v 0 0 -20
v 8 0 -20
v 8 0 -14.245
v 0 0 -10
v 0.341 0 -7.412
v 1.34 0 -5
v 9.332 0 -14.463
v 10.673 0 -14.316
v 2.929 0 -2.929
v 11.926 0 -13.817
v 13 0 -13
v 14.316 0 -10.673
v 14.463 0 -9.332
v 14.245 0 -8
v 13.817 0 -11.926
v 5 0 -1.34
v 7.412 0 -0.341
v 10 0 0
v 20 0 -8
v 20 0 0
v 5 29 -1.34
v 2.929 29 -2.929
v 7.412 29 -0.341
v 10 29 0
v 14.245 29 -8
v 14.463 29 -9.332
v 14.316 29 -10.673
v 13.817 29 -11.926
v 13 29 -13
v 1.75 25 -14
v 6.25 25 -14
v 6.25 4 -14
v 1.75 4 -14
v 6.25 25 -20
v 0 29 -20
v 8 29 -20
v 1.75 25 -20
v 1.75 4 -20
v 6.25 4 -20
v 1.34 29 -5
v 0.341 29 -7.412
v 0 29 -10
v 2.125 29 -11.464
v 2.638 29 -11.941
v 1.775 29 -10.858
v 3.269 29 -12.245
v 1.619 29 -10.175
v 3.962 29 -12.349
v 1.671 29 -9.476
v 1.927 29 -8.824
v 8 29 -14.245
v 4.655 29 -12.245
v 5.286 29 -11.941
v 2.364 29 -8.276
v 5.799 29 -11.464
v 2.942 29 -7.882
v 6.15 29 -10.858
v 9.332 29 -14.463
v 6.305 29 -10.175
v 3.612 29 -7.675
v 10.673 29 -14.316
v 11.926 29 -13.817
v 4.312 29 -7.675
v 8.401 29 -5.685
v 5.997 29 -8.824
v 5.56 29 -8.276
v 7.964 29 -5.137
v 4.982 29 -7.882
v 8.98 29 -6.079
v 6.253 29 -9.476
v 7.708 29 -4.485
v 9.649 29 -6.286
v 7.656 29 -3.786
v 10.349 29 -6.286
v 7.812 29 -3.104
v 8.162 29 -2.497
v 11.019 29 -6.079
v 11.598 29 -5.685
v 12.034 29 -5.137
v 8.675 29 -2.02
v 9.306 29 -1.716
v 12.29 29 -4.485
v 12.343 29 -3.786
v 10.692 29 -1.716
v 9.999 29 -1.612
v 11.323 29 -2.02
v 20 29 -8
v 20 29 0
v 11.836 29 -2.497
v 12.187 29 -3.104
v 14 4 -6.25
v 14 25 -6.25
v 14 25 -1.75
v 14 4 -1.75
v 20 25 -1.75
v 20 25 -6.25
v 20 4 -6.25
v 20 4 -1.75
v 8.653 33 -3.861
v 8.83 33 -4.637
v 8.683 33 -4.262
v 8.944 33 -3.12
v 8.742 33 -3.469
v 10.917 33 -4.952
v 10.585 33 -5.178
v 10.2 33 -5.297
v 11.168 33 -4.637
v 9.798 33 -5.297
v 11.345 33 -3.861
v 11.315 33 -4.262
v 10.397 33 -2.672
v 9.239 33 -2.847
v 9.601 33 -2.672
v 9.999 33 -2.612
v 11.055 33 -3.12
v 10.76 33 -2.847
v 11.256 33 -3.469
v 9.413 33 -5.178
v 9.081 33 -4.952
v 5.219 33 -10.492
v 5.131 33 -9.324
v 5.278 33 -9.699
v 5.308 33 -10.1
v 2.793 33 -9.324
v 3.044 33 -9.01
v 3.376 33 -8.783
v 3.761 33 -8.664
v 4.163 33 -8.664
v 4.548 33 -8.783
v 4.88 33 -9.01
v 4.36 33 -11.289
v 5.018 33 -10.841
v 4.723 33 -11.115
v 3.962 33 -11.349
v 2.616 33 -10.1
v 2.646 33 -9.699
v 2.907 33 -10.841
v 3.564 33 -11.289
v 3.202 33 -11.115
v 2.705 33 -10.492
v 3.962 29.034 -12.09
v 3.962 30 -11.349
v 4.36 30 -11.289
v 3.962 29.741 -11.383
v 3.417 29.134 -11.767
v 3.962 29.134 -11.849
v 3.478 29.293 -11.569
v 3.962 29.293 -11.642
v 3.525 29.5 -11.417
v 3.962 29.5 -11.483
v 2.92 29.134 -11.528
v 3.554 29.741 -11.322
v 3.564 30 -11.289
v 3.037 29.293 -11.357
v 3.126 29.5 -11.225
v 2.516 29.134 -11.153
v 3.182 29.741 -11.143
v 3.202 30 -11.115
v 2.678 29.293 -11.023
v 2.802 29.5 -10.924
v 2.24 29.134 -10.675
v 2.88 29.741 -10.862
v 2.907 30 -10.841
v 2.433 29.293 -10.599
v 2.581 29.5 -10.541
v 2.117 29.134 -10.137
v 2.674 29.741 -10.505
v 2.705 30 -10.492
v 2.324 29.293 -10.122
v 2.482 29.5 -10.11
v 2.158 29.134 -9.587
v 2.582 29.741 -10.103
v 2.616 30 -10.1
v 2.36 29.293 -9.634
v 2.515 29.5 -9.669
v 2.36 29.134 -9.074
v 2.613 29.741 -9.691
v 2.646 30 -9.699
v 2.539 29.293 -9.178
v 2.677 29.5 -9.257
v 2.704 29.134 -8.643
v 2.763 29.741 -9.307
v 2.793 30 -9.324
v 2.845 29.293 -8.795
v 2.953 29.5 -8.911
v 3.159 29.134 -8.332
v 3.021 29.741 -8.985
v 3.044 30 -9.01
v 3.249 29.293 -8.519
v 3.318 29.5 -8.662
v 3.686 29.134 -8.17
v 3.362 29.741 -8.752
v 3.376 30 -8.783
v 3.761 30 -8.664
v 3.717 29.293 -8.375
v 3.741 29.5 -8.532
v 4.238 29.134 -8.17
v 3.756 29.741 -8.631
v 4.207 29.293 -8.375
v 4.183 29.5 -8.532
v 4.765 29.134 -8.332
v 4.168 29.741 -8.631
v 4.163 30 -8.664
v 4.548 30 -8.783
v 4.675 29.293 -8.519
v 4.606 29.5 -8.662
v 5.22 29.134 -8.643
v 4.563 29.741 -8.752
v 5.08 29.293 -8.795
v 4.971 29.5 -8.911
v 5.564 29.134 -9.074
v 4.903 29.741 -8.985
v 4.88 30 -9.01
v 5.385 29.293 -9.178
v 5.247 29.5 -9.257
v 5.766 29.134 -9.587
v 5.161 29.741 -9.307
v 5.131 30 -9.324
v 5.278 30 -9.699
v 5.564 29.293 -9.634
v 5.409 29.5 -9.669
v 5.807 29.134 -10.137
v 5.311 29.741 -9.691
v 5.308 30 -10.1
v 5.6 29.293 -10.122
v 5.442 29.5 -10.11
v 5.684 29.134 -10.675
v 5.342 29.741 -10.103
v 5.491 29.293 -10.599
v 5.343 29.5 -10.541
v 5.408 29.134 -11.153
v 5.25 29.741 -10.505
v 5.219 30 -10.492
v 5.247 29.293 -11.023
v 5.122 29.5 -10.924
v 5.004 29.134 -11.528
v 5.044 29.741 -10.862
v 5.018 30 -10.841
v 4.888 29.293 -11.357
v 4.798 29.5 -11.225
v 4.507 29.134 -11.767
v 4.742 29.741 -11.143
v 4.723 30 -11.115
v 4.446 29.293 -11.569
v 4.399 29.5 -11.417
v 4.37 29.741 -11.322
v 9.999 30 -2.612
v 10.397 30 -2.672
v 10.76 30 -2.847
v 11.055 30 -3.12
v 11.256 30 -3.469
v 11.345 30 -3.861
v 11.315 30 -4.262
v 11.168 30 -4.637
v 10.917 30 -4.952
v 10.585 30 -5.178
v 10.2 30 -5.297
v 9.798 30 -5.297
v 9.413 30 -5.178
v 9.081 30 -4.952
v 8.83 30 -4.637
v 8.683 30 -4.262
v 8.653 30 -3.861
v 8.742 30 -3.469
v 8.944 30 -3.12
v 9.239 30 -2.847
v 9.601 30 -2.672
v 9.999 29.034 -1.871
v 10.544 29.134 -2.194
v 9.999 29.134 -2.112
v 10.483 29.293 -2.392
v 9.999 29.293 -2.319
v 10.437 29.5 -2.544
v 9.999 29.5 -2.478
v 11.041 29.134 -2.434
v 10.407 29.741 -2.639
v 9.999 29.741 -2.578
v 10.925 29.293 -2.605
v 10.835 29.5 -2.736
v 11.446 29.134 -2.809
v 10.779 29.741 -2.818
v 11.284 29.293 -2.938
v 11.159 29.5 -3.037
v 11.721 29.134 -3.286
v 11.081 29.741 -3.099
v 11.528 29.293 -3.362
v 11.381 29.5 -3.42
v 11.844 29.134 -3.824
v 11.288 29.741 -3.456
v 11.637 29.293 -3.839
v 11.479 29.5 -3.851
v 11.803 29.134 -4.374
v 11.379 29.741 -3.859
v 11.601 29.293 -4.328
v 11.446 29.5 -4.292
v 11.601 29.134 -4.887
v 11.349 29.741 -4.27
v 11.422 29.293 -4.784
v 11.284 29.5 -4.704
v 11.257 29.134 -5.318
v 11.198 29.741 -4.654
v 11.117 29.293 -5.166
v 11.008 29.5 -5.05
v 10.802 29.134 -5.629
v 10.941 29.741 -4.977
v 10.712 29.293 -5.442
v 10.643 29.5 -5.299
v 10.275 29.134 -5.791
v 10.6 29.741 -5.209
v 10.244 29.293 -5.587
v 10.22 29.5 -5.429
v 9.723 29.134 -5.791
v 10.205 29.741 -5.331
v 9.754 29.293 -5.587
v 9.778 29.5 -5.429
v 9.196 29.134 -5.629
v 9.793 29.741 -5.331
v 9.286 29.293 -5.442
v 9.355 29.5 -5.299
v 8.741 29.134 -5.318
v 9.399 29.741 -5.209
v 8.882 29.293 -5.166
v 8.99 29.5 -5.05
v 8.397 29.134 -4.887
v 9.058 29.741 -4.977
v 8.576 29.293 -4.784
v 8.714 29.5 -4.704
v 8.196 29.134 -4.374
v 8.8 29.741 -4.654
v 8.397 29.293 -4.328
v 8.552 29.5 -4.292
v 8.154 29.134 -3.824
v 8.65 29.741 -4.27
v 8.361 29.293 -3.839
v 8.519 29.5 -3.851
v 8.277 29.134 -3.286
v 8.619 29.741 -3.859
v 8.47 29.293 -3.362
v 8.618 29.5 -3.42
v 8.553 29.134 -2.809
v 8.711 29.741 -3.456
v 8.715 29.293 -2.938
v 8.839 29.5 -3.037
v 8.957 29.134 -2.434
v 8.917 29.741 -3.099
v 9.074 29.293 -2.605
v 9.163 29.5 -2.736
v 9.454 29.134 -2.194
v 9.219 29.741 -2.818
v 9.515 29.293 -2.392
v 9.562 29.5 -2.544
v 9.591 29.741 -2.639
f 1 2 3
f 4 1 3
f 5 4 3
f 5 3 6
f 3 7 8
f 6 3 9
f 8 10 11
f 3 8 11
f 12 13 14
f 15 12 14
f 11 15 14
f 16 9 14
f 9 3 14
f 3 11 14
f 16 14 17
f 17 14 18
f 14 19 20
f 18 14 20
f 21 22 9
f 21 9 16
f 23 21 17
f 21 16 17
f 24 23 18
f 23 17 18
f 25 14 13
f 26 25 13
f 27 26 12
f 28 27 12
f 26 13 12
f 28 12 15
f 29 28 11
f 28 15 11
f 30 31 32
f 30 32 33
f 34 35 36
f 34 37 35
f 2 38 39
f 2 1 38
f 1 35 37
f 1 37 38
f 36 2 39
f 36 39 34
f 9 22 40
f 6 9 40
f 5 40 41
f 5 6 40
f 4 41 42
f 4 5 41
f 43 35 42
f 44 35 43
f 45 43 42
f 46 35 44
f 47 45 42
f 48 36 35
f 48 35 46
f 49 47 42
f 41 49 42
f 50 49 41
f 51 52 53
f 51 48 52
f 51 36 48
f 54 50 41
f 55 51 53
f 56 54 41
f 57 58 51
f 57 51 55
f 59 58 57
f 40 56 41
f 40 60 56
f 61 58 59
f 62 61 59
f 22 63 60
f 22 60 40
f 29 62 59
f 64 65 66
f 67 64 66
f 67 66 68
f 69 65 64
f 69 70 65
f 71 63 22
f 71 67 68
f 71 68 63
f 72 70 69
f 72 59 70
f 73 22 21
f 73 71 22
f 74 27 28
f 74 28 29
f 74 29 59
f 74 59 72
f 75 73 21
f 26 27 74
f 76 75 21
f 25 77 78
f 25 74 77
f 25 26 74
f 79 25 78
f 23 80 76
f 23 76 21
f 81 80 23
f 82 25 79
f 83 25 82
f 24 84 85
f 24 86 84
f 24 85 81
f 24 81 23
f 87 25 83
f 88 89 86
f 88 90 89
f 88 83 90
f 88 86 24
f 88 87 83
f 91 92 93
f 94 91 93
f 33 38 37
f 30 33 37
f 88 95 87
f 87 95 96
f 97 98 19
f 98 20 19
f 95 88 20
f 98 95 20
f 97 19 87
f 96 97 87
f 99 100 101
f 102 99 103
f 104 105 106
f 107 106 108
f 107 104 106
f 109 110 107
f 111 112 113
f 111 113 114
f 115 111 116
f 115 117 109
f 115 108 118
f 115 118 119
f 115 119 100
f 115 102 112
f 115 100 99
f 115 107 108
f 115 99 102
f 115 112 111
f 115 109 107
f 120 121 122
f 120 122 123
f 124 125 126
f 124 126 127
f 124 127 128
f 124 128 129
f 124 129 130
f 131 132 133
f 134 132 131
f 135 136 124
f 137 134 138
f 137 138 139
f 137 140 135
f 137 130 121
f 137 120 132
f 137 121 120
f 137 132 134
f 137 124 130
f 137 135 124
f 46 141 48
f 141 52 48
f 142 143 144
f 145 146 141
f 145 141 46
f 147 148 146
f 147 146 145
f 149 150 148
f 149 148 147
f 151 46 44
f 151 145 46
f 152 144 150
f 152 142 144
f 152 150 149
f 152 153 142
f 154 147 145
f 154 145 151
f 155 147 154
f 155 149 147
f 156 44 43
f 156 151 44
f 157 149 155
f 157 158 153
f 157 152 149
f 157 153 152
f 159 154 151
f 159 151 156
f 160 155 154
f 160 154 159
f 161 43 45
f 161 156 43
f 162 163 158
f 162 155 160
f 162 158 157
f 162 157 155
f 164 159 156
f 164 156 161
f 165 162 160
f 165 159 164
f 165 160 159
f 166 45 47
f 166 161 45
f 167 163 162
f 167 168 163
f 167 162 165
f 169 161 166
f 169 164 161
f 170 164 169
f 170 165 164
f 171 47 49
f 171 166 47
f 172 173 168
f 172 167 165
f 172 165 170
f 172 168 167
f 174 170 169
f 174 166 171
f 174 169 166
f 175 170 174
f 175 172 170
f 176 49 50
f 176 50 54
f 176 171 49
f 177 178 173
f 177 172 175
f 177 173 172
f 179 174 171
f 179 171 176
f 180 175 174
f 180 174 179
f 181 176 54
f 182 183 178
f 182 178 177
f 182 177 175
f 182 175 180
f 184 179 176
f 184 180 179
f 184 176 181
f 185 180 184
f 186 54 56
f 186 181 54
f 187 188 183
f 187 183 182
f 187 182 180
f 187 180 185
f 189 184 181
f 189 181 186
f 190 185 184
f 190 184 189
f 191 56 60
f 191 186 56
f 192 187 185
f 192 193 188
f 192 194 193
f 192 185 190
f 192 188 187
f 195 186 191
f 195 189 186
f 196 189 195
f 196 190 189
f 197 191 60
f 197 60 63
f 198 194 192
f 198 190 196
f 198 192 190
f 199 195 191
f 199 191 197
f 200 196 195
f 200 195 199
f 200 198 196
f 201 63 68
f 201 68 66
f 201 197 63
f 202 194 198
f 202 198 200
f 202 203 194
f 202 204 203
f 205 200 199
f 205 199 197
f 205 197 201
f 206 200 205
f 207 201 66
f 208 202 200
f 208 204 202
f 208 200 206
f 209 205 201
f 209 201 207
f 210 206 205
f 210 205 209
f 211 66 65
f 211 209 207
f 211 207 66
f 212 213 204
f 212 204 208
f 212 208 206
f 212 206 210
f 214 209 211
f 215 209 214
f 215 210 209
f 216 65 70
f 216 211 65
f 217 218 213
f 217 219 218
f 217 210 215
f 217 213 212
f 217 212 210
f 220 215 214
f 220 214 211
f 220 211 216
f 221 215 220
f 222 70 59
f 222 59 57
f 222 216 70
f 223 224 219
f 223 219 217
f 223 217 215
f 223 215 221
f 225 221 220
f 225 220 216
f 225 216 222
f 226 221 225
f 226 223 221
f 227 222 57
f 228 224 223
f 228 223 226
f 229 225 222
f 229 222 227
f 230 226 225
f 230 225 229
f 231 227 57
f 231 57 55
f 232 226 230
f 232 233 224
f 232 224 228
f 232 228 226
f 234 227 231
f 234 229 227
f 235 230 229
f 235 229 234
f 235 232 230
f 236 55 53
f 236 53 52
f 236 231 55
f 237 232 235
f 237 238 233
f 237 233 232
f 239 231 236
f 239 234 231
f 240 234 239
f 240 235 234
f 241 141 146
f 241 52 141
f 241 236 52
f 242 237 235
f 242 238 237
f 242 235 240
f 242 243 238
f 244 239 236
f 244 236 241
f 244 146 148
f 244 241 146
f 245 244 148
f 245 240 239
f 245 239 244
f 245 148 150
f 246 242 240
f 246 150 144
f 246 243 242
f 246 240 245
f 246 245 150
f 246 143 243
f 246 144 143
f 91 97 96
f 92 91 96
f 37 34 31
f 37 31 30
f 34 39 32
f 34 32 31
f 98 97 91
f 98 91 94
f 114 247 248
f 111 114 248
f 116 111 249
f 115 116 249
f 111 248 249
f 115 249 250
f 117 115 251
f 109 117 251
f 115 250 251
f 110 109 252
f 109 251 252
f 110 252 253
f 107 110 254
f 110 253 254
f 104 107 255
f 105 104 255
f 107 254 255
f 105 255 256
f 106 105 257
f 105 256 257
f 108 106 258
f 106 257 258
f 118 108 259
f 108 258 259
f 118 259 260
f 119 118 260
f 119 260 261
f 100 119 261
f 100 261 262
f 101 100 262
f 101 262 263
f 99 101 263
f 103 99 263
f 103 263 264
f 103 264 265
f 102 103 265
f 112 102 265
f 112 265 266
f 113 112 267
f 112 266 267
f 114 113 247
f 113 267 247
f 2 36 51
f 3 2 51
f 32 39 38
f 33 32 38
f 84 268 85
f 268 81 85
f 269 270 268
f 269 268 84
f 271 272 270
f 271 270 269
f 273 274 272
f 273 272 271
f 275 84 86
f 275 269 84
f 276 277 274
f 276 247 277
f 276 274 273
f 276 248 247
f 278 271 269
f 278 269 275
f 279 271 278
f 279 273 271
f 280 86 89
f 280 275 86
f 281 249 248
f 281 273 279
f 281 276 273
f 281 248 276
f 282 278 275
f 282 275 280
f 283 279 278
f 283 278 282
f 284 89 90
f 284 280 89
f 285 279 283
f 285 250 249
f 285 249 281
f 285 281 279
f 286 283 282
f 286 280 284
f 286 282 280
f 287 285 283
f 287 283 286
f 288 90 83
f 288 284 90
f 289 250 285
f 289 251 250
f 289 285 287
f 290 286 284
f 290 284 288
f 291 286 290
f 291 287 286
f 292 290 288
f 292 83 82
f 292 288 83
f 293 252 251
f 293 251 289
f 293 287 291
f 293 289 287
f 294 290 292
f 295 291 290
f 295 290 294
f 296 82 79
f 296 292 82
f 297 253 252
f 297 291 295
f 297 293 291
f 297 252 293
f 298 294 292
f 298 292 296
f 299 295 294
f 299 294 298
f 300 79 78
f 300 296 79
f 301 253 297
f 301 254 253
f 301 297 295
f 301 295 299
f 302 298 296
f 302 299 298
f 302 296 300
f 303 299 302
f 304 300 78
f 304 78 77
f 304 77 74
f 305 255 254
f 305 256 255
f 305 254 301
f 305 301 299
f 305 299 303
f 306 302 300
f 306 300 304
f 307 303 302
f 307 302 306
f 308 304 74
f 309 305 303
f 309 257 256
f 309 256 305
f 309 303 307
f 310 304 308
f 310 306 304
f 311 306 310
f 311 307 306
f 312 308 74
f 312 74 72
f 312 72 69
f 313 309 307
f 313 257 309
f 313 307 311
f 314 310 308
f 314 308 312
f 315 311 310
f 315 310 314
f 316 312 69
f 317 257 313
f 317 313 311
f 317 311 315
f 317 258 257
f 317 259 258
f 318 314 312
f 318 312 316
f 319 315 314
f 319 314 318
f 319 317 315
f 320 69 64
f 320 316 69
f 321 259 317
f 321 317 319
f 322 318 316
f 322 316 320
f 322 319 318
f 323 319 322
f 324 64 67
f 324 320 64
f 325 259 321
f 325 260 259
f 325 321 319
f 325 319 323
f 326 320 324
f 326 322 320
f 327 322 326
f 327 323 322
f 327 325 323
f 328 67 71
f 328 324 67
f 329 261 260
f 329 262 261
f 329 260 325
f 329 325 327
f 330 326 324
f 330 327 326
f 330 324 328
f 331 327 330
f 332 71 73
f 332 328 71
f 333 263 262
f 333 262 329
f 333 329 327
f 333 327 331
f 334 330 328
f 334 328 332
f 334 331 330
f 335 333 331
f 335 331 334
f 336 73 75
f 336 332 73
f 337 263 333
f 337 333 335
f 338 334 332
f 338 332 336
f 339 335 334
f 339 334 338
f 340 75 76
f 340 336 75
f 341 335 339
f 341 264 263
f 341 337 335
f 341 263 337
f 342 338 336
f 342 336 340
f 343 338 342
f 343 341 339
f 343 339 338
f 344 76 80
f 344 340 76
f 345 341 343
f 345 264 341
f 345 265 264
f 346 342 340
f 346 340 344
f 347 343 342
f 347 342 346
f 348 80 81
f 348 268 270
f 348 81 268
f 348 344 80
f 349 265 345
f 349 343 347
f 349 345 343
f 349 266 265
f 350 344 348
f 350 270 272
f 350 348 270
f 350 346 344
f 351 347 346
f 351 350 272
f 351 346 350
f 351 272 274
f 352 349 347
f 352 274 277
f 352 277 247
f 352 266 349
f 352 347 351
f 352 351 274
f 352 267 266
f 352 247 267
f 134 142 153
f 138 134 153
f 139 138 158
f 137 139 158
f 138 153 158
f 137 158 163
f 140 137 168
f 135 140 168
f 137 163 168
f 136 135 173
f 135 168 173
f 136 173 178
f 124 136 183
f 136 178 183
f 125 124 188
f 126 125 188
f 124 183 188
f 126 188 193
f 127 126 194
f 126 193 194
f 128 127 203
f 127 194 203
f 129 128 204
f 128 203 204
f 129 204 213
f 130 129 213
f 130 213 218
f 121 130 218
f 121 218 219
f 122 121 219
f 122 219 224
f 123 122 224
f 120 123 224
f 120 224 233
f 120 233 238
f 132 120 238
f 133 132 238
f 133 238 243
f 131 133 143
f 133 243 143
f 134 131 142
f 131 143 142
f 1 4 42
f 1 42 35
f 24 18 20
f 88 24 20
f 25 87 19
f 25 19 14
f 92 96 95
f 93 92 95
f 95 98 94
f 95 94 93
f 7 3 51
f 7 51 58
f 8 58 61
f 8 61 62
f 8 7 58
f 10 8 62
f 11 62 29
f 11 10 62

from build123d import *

# Parameters (mm, degrees)
BOSS_EXTRUDE1_DEPTH = 29
SKETCH3_W           = 4.5
SKETCH3_H           = 21
CUT_EXTRUDE1_DEPTH  = 6
SKETCH5_R           = 1.35
BOSS_EXTRUDE2_DEPTH = 4
FILLET1_R           = 1


with BuildPart() as part:
    # Sketch2 → Boss-Extrude1 (new body)
    with BuildSketch(Plane(origin=(0, 0, 0), x_dir=(1, 0, 0), z_dir=(0, 1, 0))):
        with BuildLine():
            Line((0, 10), (0, 20))
            Line((0, 20), (8, 20))
            Line((8, 20), (8, 14.245191882))
            ThreePointArc((8, 14.245191882), (10.672752557, 14.316274399), (13, 13))
            Line((13, 13), (9.464466094, 9.464466094))
            Line((9.464466094, 9.464466094), (2.928932188, 2.928932188))
            ThreePointArc((2.928932188, 2.928932188), (0.761204675, 6.173165676), (0, 10))
        make_face()
    boss_extrude1 = extrude(amount=BOSS_EXTRUDE1_DEPTH)

    # Mirror1: Boss-Extrude1 across plane
    add(boss_extrude1.mirror(Plane(origin=(0, 0, 0), x_dir=(-0.707106781186546, 0, 0.707106781186549), z_dir=(0.707106781186549, 0, 0.707106781186546))))

    # Sketch3 → Cut-Extrude1 (cut)
    with BuildSketch(Plane(origin=(0, 0, -20), x_dir=(-1, 0, 0), z_dir=(0, 0, -1))):
        with Locations((-4, 14.5)):
            Rectangle(SKETCH3_W, SKETCH3_H)
    cut_extrude1 = extrude(amount=-CUT_EXTRUDE1_DEPTH, mode=Mode.SUBTRACT)

    # Mirror2: Cut-Extrude1 across plane
    add(cut_extrude1.mirror(Plane(origin=(0, 0, 0), x_dir=(-0.707106781186546, 0, 0.707106781186549), z_dir=(0.707106781186549, 0, 0.707106781186546))), mode=Mode.SUBTRACT)

    # Sketch5 → Boss-Extrude2 (add)
    with BuildSketch(Plane(origin=(0, 29, 0), x_dir=(1, 0, 0), z_dir=(0, 1, 0))):
        with Locations(Location((9.999139198, 3.962062278, 0), (0, 0, 270))):
            Circle(SKETCH5_R)
        with Locations(Location((3.962062278, 9.999139198, 0), (0, 0, 90))):
            Circle(SKETCH5_R)
    extrude(amount=BOSS_EXTRUDE2_DEPTH)

    # Fillet1
    fillet1_edges = [part.edges().sort_by_distance(p)[0] for p in [
        (9.999139198, 29, -5.312062278),
        (3.962062278, 29, -8.649139198),
    ]]
    fillet(fillet1_edges, radius=FILLET1_R)


solid = part.part
